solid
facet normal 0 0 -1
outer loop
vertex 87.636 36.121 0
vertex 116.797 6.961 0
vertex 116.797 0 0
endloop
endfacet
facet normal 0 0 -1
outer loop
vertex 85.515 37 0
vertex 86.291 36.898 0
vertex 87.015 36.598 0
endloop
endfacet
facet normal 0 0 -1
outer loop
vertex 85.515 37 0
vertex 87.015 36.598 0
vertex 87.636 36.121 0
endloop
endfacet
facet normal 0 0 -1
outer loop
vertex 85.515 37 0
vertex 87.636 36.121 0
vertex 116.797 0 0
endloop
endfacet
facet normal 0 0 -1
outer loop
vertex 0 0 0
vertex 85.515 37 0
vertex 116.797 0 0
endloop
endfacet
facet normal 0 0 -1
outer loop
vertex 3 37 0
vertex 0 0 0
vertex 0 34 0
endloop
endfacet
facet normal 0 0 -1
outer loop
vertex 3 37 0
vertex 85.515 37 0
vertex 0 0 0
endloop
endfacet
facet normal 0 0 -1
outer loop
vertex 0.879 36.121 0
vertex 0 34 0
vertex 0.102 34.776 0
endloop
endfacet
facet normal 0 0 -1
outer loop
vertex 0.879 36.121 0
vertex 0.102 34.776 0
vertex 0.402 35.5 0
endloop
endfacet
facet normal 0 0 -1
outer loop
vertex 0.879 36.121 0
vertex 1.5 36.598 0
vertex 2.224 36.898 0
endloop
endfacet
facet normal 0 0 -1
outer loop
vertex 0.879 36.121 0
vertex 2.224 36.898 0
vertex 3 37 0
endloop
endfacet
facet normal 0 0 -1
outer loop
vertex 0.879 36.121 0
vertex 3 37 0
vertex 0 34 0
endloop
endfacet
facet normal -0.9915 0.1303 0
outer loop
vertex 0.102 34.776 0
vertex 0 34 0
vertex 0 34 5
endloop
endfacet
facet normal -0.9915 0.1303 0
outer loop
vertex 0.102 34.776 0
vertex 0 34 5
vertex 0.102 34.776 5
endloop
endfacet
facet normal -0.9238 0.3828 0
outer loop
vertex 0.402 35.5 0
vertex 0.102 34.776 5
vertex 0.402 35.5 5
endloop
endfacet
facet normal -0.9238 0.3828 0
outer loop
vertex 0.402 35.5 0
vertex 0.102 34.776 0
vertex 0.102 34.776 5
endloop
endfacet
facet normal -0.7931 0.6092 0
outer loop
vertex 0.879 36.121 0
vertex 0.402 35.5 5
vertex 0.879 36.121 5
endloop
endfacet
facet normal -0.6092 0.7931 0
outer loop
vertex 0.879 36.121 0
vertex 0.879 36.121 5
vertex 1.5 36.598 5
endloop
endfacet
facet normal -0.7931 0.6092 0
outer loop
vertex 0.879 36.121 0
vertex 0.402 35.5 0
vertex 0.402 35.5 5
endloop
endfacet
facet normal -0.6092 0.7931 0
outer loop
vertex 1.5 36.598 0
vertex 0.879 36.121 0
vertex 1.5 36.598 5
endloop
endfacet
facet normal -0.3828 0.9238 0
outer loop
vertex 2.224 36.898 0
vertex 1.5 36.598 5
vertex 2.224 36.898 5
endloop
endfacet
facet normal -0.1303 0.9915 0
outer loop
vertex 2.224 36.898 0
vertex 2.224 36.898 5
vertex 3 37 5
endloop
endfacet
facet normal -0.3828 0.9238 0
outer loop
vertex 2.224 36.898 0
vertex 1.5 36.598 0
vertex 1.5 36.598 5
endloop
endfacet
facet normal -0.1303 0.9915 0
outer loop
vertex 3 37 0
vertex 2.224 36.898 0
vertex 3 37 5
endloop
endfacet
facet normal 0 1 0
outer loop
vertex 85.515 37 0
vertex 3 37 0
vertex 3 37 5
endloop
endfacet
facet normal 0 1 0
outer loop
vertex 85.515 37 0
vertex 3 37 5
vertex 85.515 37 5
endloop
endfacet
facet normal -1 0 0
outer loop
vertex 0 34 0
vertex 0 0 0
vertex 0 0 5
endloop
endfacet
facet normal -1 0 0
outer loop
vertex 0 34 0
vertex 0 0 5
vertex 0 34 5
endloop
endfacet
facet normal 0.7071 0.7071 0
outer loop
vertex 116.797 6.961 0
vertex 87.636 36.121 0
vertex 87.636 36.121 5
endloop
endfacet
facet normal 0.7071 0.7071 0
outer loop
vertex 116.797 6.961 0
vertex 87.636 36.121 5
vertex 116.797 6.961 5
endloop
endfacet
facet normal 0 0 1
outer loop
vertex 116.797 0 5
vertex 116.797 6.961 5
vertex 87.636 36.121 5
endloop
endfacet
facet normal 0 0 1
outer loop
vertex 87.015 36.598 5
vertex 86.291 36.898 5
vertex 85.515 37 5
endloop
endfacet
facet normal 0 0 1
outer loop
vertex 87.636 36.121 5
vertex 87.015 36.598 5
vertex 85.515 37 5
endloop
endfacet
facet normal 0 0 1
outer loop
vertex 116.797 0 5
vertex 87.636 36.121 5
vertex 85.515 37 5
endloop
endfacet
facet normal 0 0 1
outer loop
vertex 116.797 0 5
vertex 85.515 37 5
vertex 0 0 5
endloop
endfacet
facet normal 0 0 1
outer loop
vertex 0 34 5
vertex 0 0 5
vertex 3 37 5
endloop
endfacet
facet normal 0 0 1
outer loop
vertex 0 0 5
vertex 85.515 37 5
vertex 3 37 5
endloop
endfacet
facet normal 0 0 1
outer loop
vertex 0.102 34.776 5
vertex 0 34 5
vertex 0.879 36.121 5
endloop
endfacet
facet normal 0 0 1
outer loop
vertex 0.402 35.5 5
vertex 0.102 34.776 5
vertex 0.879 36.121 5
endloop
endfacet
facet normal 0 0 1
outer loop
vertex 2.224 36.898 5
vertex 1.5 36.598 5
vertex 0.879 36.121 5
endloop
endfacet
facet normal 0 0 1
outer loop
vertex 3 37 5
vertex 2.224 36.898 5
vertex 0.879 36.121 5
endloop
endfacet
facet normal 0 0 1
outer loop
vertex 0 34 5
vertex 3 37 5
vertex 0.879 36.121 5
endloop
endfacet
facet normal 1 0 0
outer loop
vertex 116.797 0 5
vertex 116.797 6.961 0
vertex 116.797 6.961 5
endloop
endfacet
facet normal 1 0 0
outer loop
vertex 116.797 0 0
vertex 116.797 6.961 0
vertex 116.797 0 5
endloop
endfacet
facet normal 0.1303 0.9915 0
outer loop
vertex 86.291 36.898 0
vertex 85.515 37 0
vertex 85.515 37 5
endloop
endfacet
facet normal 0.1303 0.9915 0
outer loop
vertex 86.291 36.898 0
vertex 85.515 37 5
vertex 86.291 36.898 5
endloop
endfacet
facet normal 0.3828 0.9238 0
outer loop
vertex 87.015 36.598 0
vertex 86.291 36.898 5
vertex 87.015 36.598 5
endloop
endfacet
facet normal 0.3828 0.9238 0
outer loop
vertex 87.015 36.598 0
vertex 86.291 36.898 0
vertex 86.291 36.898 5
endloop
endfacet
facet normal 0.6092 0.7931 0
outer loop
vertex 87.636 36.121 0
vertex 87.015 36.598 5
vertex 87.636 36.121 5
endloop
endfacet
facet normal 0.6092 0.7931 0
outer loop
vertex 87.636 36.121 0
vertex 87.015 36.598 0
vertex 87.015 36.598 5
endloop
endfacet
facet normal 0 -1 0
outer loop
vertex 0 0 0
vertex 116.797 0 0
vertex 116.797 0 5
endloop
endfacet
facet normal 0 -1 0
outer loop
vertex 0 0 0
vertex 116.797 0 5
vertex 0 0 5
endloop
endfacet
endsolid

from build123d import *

# Parameters (mm, degrees)
SALIENTE_EXTRUIR1_DEPTH = 5


with BuildPart() as part:
    # Croquis1 → Saliente-Extruir1 (new body)
    with BuildSketch(Plane.XY):
        with BuildLine():
            Line((87.636038969, 36.121320344), (116.796683693, 6.96067562))
            Line((116.796683693, 6.96067562), (116.796683693, 0))
            Line((116.796683693, 0), (0, 0))
            Line((0, 0), (0, 34))
            ThreePointArc((0, 34), (0.878679656, 36.121320344), (3, 37))
            Line((3, 37), (85.514718626, 37))
            ThreePointArc((85.514718626, 37), (86.662768923, 36.771638598), (87.636038969, 36.121320344))
        make_face()
    extrude(amount=SALIENTE_EXTRUIR1_DEPTH)


solid = part.part
